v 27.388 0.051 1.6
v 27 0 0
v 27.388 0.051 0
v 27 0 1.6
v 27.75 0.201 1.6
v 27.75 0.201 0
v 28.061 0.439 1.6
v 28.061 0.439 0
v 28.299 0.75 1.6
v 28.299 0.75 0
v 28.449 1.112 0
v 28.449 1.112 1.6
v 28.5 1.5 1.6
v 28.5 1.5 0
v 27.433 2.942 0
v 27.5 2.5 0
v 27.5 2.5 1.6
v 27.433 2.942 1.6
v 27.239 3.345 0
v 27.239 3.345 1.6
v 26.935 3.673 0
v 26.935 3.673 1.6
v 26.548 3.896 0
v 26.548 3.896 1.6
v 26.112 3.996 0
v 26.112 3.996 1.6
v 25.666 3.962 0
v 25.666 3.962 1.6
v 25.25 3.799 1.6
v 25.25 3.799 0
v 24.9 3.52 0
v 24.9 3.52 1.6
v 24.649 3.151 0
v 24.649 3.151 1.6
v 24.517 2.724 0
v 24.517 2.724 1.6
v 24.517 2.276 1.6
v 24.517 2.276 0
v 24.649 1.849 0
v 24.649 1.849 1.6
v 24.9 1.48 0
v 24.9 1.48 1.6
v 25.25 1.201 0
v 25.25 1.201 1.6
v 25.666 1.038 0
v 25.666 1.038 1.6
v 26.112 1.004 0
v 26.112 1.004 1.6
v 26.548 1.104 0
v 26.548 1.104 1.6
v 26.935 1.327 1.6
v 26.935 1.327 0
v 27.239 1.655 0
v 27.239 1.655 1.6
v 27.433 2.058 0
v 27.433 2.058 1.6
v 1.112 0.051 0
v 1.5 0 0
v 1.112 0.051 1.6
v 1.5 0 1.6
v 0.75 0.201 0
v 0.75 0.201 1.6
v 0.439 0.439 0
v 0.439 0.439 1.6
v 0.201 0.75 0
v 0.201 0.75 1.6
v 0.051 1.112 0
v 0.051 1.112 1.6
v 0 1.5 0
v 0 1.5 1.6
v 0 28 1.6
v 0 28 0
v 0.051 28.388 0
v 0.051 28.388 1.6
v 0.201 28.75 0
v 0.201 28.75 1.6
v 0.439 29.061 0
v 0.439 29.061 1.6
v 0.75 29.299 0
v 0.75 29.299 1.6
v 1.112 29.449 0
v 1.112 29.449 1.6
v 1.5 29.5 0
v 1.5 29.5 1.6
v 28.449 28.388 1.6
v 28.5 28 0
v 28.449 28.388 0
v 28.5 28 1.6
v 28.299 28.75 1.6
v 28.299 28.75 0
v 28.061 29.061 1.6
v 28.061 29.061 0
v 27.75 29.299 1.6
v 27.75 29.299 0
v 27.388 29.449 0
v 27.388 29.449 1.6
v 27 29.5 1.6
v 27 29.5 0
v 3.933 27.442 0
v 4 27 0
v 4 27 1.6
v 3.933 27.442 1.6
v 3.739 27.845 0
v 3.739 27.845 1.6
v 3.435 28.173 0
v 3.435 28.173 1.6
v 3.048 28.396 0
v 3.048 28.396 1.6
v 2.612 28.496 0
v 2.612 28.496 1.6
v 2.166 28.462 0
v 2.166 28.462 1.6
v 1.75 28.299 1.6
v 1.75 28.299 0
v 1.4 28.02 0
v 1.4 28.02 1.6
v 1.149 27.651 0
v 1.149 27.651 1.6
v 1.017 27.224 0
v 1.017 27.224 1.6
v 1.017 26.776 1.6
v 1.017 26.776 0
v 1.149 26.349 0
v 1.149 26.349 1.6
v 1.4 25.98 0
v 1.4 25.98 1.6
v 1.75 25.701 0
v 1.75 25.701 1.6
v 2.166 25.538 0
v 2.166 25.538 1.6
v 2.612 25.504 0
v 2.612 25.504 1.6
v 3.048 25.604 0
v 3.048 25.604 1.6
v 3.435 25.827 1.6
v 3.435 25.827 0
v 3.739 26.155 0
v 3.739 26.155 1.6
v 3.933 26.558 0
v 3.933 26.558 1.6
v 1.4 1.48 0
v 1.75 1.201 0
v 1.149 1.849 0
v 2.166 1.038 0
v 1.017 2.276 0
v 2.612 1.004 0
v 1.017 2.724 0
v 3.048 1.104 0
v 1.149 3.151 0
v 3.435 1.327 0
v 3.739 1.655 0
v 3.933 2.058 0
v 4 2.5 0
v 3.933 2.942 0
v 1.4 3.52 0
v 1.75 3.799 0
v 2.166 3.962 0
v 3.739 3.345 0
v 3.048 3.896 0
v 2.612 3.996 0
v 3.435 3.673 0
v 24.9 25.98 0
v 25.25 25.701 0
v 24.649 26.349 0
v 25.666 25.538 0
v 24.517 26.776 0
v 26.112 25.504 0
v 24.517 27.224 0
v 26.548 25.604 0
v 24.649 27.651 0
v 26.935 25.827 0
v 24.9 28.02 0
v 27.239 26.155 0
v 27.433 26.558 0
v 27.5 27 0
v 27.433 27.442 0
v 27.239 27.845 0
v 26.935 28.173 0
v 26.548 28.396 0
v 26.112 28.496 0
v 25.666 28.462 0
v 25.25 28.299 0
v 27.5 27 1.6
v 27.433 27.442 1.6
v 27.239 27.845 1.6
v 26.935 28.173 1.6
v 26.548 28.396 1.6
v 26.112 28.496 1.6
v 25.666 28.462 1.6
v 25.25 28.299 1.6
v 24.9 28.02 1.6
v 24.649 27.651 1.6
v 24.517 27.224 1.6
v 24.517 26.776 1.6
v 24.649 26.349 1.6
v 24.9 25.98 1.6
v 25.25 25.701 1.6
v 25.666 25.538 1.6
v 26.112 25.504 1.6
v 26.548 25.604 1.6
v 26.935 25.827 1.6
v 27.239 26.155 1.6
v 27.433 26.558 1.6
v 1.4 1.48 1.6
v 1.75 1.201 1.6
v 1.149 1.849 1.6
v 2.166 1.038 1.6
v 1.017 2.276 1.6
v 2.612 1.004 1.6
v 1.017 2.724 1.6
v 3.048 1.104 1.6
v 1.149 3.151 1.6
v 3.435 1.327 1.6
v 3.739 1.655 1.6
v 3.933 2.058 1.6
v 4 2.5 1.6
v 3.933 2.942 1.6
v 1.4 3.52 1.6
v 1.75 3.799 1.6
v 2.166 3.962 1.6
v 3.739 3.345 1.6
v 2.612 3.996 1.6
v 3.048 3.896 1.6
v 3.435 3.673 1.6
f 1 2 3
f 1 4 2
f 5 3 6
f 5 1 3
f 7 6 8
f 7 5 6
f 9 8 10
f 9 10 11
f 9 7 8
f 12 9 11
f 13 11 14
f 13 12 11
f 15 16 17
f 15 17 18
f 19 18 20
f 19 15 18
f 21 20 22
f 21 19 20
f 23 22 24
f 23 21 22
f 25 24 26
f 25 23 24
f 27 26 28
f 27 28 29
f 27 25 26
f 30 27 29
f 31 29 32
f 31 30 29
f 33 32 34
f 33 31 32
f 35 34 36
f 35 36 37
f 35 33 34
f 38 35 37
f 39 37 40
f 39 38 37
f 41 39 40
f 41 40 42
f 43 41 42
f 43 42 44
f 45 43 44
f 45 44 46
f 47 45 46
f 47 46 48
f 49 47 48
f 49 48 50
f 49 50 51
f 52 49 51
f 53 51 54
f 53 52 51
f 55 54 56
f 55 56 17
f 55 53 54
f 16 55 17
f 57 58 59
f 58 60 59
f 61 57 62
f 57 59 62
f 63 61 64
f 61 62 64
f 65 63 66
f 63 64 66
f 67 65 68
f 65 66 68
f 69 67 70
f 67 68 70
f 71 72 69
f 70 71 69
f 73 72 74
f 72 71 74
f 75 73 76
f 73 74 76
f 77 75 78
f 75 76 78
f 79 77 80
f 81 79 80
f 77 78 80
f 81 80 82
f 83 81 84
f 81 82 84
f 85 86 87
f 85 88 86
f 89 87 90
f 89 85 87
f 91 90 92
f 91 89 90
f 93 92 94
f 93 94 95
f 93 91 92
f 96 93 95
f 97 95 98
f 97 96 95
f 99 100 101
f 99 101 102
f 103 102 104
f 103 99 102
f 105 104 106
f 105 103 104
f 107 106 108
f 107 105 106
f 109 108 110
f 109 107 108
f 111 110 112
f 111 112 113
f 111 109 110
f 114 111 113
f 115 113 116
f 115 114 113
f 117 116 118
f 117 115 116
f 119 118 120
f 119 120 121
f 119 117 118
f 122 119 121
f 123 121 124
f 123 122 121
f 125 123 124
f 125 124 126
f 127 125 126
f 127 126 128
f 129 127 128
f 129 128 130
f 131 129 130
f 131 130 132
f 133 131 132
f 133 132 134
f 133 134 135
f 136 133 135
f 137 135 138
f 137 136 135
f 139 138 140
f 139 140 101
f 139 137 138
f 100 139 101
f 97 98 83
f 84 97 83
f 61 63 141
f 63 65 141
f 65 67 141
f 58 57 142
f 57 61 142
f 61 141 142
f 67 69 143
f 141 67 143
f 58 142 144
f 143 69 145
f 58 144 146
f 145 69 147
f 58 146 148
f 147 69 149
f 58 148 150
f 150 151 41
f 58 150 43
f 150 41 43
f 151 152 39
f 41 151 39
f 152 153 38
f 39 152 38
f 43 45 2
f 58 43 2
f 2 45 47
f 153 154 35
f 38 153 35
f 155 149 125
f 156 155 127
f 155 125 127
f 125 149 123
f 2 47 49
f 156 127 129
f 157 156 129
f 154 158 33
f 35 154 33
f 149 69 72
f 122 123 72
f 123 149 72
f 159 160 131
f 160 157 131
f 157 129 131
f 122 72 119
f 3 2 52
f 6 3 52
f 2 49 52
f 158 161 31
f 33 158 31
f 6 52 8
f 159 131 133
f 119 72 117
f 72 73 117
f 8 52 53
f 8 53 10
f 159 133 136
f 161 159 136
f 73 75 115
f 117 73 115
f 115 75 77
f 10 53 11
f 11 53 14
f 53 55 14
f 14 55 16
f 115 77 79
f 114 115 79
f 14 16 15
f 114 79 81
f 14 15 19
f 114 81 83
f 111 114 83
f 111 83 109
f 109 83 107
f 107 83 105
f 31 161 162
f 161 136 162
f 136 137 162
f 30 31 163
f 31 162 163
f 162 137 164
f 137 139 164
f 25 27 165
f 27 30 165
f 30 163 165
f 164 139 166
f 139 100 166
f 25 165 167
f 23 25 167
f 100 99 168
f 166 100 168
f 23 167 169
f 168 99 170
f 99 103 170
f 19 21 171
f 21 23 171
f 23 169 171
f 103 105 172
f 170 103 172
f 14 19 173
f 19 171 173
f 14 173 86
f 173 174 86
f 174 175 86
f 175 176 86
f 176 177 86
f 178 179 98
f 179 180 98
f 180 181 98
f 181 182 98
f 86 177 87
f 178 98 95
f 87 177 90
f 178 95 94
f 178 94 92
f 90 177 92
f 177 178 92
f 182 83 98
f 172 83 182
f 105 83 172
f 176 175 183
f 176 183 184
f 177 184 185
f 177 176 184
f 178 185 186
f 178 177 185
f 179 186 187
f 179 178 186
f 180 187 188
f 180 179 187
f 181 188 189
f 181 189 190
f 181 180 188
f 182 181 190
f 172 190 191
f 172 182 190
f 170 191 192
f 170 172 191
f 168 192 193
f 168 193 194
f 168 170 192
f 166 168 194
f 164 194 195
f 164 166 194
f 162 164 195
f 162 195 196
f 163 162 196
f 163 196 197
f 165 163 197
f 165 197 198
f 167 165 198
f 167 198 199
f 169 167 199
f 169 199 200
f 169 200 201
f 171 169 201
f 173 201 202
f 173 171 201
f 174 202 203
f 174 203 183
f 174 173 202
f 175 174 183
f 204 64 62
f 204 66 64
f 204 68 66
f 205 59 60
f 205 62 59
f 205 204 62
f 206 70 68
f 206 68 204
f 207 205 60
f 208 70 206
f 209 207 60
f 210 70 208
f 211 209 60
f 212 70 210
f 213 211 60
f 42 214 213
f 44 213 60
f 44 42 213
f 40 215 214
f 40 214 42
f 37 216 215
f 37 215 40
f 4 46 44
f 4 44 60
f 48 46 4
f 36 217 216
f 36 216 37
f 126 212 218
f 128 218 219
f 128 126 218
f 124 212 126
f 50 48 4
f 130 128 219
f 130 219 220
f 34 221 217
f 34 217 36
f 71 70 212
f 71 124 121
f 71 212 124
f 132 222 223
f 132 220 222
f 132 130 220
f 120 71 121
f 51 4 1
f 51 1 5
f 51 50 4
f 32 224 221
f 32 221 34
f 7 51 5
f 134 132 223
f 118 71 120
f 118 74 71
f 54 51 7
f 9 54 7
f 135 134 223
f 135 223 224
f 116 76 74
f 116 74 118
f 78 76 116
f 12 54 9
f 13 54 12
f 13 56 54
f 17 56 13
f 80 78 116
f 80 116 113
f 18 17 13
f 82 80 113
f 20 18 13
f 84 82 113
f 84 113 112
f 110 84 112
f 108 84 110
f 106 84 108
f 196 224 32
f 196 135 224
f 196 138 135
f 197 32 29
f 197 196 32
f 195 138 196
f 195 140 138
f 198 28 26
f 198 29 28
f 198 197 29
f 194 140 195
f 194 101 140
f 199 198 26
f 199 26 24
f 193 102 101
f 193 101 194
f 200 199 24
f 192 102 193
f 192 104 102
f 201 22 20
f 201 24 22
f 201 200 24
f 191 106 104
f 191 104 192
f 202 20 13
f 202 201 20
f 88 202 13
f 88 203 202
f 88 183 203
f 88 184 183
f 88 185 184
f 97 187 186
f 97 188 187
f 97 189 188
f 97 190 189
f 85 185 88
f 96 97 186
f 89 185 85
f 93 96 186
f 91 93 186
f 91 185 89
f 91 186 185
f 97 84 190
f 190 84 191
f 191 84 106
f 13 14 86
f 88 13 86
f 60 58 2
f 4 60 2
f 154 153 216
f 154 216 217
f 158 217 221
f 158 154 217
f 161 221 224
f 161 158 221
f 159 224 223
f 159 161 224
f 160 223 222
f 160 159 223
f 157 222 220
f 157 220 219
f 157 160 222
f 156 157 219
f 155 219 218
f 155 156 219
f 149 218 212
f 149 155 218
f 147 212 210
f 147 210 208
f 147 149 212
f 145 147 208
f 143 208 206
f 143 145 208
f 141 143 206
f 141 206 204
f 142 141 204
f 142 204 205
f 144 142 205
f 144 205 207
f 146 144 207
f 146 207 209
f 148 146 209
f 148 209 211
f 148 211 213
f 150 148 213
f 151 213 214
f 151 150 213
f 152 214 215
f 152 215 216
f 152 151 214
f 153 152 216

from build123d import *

# Parameters (mm, degrees)
SKETCH_1_R      = 1.5
EXTRUDE_1_DEPTH = 1.6
FILLET_1_R      = 1.5


with BuildPart() as part:
    # 草图1 → 凸台-拉伸1 (new body)
    with BuildSketch(Plane.XY):
        Polygon((0, 0), (28.5, 0), (28.5, 29.5), (2.5, 29.5), (0, 29.5), align=None)
        with Locations((2.5, 27)):
            Circle(SKETCH_1_R, mode=Mode.SUBTRACT)
        with Locations((26, 27)):
            Circle(SKETCH_1_R, mode=Mode.SUBTRACT)
        with Locations((26, 2.5)):
            Circle(SKETCH_1_R, mode=Mode.SUBTRACT)
        with Locations((2.5, 2.5)):
            Circle(SKETCH_1_R, mode=Mode.SUBTRACT)
    extrude(amount=EXTRUDE_1_DEPTH)

    # 圆角1
    fillet_1_edges = [part.edges().sort_by_distance(p)[0] for p in [
        (0, 29.5, 0.8),
        (28.5, 29.5, 0.8),
        (28.5, 0, 0.8),
        (0, 0, 0.8),
    ]]
    fillet(fillet_1_edges, radius=FILLET_1_R)


solid = part.part
